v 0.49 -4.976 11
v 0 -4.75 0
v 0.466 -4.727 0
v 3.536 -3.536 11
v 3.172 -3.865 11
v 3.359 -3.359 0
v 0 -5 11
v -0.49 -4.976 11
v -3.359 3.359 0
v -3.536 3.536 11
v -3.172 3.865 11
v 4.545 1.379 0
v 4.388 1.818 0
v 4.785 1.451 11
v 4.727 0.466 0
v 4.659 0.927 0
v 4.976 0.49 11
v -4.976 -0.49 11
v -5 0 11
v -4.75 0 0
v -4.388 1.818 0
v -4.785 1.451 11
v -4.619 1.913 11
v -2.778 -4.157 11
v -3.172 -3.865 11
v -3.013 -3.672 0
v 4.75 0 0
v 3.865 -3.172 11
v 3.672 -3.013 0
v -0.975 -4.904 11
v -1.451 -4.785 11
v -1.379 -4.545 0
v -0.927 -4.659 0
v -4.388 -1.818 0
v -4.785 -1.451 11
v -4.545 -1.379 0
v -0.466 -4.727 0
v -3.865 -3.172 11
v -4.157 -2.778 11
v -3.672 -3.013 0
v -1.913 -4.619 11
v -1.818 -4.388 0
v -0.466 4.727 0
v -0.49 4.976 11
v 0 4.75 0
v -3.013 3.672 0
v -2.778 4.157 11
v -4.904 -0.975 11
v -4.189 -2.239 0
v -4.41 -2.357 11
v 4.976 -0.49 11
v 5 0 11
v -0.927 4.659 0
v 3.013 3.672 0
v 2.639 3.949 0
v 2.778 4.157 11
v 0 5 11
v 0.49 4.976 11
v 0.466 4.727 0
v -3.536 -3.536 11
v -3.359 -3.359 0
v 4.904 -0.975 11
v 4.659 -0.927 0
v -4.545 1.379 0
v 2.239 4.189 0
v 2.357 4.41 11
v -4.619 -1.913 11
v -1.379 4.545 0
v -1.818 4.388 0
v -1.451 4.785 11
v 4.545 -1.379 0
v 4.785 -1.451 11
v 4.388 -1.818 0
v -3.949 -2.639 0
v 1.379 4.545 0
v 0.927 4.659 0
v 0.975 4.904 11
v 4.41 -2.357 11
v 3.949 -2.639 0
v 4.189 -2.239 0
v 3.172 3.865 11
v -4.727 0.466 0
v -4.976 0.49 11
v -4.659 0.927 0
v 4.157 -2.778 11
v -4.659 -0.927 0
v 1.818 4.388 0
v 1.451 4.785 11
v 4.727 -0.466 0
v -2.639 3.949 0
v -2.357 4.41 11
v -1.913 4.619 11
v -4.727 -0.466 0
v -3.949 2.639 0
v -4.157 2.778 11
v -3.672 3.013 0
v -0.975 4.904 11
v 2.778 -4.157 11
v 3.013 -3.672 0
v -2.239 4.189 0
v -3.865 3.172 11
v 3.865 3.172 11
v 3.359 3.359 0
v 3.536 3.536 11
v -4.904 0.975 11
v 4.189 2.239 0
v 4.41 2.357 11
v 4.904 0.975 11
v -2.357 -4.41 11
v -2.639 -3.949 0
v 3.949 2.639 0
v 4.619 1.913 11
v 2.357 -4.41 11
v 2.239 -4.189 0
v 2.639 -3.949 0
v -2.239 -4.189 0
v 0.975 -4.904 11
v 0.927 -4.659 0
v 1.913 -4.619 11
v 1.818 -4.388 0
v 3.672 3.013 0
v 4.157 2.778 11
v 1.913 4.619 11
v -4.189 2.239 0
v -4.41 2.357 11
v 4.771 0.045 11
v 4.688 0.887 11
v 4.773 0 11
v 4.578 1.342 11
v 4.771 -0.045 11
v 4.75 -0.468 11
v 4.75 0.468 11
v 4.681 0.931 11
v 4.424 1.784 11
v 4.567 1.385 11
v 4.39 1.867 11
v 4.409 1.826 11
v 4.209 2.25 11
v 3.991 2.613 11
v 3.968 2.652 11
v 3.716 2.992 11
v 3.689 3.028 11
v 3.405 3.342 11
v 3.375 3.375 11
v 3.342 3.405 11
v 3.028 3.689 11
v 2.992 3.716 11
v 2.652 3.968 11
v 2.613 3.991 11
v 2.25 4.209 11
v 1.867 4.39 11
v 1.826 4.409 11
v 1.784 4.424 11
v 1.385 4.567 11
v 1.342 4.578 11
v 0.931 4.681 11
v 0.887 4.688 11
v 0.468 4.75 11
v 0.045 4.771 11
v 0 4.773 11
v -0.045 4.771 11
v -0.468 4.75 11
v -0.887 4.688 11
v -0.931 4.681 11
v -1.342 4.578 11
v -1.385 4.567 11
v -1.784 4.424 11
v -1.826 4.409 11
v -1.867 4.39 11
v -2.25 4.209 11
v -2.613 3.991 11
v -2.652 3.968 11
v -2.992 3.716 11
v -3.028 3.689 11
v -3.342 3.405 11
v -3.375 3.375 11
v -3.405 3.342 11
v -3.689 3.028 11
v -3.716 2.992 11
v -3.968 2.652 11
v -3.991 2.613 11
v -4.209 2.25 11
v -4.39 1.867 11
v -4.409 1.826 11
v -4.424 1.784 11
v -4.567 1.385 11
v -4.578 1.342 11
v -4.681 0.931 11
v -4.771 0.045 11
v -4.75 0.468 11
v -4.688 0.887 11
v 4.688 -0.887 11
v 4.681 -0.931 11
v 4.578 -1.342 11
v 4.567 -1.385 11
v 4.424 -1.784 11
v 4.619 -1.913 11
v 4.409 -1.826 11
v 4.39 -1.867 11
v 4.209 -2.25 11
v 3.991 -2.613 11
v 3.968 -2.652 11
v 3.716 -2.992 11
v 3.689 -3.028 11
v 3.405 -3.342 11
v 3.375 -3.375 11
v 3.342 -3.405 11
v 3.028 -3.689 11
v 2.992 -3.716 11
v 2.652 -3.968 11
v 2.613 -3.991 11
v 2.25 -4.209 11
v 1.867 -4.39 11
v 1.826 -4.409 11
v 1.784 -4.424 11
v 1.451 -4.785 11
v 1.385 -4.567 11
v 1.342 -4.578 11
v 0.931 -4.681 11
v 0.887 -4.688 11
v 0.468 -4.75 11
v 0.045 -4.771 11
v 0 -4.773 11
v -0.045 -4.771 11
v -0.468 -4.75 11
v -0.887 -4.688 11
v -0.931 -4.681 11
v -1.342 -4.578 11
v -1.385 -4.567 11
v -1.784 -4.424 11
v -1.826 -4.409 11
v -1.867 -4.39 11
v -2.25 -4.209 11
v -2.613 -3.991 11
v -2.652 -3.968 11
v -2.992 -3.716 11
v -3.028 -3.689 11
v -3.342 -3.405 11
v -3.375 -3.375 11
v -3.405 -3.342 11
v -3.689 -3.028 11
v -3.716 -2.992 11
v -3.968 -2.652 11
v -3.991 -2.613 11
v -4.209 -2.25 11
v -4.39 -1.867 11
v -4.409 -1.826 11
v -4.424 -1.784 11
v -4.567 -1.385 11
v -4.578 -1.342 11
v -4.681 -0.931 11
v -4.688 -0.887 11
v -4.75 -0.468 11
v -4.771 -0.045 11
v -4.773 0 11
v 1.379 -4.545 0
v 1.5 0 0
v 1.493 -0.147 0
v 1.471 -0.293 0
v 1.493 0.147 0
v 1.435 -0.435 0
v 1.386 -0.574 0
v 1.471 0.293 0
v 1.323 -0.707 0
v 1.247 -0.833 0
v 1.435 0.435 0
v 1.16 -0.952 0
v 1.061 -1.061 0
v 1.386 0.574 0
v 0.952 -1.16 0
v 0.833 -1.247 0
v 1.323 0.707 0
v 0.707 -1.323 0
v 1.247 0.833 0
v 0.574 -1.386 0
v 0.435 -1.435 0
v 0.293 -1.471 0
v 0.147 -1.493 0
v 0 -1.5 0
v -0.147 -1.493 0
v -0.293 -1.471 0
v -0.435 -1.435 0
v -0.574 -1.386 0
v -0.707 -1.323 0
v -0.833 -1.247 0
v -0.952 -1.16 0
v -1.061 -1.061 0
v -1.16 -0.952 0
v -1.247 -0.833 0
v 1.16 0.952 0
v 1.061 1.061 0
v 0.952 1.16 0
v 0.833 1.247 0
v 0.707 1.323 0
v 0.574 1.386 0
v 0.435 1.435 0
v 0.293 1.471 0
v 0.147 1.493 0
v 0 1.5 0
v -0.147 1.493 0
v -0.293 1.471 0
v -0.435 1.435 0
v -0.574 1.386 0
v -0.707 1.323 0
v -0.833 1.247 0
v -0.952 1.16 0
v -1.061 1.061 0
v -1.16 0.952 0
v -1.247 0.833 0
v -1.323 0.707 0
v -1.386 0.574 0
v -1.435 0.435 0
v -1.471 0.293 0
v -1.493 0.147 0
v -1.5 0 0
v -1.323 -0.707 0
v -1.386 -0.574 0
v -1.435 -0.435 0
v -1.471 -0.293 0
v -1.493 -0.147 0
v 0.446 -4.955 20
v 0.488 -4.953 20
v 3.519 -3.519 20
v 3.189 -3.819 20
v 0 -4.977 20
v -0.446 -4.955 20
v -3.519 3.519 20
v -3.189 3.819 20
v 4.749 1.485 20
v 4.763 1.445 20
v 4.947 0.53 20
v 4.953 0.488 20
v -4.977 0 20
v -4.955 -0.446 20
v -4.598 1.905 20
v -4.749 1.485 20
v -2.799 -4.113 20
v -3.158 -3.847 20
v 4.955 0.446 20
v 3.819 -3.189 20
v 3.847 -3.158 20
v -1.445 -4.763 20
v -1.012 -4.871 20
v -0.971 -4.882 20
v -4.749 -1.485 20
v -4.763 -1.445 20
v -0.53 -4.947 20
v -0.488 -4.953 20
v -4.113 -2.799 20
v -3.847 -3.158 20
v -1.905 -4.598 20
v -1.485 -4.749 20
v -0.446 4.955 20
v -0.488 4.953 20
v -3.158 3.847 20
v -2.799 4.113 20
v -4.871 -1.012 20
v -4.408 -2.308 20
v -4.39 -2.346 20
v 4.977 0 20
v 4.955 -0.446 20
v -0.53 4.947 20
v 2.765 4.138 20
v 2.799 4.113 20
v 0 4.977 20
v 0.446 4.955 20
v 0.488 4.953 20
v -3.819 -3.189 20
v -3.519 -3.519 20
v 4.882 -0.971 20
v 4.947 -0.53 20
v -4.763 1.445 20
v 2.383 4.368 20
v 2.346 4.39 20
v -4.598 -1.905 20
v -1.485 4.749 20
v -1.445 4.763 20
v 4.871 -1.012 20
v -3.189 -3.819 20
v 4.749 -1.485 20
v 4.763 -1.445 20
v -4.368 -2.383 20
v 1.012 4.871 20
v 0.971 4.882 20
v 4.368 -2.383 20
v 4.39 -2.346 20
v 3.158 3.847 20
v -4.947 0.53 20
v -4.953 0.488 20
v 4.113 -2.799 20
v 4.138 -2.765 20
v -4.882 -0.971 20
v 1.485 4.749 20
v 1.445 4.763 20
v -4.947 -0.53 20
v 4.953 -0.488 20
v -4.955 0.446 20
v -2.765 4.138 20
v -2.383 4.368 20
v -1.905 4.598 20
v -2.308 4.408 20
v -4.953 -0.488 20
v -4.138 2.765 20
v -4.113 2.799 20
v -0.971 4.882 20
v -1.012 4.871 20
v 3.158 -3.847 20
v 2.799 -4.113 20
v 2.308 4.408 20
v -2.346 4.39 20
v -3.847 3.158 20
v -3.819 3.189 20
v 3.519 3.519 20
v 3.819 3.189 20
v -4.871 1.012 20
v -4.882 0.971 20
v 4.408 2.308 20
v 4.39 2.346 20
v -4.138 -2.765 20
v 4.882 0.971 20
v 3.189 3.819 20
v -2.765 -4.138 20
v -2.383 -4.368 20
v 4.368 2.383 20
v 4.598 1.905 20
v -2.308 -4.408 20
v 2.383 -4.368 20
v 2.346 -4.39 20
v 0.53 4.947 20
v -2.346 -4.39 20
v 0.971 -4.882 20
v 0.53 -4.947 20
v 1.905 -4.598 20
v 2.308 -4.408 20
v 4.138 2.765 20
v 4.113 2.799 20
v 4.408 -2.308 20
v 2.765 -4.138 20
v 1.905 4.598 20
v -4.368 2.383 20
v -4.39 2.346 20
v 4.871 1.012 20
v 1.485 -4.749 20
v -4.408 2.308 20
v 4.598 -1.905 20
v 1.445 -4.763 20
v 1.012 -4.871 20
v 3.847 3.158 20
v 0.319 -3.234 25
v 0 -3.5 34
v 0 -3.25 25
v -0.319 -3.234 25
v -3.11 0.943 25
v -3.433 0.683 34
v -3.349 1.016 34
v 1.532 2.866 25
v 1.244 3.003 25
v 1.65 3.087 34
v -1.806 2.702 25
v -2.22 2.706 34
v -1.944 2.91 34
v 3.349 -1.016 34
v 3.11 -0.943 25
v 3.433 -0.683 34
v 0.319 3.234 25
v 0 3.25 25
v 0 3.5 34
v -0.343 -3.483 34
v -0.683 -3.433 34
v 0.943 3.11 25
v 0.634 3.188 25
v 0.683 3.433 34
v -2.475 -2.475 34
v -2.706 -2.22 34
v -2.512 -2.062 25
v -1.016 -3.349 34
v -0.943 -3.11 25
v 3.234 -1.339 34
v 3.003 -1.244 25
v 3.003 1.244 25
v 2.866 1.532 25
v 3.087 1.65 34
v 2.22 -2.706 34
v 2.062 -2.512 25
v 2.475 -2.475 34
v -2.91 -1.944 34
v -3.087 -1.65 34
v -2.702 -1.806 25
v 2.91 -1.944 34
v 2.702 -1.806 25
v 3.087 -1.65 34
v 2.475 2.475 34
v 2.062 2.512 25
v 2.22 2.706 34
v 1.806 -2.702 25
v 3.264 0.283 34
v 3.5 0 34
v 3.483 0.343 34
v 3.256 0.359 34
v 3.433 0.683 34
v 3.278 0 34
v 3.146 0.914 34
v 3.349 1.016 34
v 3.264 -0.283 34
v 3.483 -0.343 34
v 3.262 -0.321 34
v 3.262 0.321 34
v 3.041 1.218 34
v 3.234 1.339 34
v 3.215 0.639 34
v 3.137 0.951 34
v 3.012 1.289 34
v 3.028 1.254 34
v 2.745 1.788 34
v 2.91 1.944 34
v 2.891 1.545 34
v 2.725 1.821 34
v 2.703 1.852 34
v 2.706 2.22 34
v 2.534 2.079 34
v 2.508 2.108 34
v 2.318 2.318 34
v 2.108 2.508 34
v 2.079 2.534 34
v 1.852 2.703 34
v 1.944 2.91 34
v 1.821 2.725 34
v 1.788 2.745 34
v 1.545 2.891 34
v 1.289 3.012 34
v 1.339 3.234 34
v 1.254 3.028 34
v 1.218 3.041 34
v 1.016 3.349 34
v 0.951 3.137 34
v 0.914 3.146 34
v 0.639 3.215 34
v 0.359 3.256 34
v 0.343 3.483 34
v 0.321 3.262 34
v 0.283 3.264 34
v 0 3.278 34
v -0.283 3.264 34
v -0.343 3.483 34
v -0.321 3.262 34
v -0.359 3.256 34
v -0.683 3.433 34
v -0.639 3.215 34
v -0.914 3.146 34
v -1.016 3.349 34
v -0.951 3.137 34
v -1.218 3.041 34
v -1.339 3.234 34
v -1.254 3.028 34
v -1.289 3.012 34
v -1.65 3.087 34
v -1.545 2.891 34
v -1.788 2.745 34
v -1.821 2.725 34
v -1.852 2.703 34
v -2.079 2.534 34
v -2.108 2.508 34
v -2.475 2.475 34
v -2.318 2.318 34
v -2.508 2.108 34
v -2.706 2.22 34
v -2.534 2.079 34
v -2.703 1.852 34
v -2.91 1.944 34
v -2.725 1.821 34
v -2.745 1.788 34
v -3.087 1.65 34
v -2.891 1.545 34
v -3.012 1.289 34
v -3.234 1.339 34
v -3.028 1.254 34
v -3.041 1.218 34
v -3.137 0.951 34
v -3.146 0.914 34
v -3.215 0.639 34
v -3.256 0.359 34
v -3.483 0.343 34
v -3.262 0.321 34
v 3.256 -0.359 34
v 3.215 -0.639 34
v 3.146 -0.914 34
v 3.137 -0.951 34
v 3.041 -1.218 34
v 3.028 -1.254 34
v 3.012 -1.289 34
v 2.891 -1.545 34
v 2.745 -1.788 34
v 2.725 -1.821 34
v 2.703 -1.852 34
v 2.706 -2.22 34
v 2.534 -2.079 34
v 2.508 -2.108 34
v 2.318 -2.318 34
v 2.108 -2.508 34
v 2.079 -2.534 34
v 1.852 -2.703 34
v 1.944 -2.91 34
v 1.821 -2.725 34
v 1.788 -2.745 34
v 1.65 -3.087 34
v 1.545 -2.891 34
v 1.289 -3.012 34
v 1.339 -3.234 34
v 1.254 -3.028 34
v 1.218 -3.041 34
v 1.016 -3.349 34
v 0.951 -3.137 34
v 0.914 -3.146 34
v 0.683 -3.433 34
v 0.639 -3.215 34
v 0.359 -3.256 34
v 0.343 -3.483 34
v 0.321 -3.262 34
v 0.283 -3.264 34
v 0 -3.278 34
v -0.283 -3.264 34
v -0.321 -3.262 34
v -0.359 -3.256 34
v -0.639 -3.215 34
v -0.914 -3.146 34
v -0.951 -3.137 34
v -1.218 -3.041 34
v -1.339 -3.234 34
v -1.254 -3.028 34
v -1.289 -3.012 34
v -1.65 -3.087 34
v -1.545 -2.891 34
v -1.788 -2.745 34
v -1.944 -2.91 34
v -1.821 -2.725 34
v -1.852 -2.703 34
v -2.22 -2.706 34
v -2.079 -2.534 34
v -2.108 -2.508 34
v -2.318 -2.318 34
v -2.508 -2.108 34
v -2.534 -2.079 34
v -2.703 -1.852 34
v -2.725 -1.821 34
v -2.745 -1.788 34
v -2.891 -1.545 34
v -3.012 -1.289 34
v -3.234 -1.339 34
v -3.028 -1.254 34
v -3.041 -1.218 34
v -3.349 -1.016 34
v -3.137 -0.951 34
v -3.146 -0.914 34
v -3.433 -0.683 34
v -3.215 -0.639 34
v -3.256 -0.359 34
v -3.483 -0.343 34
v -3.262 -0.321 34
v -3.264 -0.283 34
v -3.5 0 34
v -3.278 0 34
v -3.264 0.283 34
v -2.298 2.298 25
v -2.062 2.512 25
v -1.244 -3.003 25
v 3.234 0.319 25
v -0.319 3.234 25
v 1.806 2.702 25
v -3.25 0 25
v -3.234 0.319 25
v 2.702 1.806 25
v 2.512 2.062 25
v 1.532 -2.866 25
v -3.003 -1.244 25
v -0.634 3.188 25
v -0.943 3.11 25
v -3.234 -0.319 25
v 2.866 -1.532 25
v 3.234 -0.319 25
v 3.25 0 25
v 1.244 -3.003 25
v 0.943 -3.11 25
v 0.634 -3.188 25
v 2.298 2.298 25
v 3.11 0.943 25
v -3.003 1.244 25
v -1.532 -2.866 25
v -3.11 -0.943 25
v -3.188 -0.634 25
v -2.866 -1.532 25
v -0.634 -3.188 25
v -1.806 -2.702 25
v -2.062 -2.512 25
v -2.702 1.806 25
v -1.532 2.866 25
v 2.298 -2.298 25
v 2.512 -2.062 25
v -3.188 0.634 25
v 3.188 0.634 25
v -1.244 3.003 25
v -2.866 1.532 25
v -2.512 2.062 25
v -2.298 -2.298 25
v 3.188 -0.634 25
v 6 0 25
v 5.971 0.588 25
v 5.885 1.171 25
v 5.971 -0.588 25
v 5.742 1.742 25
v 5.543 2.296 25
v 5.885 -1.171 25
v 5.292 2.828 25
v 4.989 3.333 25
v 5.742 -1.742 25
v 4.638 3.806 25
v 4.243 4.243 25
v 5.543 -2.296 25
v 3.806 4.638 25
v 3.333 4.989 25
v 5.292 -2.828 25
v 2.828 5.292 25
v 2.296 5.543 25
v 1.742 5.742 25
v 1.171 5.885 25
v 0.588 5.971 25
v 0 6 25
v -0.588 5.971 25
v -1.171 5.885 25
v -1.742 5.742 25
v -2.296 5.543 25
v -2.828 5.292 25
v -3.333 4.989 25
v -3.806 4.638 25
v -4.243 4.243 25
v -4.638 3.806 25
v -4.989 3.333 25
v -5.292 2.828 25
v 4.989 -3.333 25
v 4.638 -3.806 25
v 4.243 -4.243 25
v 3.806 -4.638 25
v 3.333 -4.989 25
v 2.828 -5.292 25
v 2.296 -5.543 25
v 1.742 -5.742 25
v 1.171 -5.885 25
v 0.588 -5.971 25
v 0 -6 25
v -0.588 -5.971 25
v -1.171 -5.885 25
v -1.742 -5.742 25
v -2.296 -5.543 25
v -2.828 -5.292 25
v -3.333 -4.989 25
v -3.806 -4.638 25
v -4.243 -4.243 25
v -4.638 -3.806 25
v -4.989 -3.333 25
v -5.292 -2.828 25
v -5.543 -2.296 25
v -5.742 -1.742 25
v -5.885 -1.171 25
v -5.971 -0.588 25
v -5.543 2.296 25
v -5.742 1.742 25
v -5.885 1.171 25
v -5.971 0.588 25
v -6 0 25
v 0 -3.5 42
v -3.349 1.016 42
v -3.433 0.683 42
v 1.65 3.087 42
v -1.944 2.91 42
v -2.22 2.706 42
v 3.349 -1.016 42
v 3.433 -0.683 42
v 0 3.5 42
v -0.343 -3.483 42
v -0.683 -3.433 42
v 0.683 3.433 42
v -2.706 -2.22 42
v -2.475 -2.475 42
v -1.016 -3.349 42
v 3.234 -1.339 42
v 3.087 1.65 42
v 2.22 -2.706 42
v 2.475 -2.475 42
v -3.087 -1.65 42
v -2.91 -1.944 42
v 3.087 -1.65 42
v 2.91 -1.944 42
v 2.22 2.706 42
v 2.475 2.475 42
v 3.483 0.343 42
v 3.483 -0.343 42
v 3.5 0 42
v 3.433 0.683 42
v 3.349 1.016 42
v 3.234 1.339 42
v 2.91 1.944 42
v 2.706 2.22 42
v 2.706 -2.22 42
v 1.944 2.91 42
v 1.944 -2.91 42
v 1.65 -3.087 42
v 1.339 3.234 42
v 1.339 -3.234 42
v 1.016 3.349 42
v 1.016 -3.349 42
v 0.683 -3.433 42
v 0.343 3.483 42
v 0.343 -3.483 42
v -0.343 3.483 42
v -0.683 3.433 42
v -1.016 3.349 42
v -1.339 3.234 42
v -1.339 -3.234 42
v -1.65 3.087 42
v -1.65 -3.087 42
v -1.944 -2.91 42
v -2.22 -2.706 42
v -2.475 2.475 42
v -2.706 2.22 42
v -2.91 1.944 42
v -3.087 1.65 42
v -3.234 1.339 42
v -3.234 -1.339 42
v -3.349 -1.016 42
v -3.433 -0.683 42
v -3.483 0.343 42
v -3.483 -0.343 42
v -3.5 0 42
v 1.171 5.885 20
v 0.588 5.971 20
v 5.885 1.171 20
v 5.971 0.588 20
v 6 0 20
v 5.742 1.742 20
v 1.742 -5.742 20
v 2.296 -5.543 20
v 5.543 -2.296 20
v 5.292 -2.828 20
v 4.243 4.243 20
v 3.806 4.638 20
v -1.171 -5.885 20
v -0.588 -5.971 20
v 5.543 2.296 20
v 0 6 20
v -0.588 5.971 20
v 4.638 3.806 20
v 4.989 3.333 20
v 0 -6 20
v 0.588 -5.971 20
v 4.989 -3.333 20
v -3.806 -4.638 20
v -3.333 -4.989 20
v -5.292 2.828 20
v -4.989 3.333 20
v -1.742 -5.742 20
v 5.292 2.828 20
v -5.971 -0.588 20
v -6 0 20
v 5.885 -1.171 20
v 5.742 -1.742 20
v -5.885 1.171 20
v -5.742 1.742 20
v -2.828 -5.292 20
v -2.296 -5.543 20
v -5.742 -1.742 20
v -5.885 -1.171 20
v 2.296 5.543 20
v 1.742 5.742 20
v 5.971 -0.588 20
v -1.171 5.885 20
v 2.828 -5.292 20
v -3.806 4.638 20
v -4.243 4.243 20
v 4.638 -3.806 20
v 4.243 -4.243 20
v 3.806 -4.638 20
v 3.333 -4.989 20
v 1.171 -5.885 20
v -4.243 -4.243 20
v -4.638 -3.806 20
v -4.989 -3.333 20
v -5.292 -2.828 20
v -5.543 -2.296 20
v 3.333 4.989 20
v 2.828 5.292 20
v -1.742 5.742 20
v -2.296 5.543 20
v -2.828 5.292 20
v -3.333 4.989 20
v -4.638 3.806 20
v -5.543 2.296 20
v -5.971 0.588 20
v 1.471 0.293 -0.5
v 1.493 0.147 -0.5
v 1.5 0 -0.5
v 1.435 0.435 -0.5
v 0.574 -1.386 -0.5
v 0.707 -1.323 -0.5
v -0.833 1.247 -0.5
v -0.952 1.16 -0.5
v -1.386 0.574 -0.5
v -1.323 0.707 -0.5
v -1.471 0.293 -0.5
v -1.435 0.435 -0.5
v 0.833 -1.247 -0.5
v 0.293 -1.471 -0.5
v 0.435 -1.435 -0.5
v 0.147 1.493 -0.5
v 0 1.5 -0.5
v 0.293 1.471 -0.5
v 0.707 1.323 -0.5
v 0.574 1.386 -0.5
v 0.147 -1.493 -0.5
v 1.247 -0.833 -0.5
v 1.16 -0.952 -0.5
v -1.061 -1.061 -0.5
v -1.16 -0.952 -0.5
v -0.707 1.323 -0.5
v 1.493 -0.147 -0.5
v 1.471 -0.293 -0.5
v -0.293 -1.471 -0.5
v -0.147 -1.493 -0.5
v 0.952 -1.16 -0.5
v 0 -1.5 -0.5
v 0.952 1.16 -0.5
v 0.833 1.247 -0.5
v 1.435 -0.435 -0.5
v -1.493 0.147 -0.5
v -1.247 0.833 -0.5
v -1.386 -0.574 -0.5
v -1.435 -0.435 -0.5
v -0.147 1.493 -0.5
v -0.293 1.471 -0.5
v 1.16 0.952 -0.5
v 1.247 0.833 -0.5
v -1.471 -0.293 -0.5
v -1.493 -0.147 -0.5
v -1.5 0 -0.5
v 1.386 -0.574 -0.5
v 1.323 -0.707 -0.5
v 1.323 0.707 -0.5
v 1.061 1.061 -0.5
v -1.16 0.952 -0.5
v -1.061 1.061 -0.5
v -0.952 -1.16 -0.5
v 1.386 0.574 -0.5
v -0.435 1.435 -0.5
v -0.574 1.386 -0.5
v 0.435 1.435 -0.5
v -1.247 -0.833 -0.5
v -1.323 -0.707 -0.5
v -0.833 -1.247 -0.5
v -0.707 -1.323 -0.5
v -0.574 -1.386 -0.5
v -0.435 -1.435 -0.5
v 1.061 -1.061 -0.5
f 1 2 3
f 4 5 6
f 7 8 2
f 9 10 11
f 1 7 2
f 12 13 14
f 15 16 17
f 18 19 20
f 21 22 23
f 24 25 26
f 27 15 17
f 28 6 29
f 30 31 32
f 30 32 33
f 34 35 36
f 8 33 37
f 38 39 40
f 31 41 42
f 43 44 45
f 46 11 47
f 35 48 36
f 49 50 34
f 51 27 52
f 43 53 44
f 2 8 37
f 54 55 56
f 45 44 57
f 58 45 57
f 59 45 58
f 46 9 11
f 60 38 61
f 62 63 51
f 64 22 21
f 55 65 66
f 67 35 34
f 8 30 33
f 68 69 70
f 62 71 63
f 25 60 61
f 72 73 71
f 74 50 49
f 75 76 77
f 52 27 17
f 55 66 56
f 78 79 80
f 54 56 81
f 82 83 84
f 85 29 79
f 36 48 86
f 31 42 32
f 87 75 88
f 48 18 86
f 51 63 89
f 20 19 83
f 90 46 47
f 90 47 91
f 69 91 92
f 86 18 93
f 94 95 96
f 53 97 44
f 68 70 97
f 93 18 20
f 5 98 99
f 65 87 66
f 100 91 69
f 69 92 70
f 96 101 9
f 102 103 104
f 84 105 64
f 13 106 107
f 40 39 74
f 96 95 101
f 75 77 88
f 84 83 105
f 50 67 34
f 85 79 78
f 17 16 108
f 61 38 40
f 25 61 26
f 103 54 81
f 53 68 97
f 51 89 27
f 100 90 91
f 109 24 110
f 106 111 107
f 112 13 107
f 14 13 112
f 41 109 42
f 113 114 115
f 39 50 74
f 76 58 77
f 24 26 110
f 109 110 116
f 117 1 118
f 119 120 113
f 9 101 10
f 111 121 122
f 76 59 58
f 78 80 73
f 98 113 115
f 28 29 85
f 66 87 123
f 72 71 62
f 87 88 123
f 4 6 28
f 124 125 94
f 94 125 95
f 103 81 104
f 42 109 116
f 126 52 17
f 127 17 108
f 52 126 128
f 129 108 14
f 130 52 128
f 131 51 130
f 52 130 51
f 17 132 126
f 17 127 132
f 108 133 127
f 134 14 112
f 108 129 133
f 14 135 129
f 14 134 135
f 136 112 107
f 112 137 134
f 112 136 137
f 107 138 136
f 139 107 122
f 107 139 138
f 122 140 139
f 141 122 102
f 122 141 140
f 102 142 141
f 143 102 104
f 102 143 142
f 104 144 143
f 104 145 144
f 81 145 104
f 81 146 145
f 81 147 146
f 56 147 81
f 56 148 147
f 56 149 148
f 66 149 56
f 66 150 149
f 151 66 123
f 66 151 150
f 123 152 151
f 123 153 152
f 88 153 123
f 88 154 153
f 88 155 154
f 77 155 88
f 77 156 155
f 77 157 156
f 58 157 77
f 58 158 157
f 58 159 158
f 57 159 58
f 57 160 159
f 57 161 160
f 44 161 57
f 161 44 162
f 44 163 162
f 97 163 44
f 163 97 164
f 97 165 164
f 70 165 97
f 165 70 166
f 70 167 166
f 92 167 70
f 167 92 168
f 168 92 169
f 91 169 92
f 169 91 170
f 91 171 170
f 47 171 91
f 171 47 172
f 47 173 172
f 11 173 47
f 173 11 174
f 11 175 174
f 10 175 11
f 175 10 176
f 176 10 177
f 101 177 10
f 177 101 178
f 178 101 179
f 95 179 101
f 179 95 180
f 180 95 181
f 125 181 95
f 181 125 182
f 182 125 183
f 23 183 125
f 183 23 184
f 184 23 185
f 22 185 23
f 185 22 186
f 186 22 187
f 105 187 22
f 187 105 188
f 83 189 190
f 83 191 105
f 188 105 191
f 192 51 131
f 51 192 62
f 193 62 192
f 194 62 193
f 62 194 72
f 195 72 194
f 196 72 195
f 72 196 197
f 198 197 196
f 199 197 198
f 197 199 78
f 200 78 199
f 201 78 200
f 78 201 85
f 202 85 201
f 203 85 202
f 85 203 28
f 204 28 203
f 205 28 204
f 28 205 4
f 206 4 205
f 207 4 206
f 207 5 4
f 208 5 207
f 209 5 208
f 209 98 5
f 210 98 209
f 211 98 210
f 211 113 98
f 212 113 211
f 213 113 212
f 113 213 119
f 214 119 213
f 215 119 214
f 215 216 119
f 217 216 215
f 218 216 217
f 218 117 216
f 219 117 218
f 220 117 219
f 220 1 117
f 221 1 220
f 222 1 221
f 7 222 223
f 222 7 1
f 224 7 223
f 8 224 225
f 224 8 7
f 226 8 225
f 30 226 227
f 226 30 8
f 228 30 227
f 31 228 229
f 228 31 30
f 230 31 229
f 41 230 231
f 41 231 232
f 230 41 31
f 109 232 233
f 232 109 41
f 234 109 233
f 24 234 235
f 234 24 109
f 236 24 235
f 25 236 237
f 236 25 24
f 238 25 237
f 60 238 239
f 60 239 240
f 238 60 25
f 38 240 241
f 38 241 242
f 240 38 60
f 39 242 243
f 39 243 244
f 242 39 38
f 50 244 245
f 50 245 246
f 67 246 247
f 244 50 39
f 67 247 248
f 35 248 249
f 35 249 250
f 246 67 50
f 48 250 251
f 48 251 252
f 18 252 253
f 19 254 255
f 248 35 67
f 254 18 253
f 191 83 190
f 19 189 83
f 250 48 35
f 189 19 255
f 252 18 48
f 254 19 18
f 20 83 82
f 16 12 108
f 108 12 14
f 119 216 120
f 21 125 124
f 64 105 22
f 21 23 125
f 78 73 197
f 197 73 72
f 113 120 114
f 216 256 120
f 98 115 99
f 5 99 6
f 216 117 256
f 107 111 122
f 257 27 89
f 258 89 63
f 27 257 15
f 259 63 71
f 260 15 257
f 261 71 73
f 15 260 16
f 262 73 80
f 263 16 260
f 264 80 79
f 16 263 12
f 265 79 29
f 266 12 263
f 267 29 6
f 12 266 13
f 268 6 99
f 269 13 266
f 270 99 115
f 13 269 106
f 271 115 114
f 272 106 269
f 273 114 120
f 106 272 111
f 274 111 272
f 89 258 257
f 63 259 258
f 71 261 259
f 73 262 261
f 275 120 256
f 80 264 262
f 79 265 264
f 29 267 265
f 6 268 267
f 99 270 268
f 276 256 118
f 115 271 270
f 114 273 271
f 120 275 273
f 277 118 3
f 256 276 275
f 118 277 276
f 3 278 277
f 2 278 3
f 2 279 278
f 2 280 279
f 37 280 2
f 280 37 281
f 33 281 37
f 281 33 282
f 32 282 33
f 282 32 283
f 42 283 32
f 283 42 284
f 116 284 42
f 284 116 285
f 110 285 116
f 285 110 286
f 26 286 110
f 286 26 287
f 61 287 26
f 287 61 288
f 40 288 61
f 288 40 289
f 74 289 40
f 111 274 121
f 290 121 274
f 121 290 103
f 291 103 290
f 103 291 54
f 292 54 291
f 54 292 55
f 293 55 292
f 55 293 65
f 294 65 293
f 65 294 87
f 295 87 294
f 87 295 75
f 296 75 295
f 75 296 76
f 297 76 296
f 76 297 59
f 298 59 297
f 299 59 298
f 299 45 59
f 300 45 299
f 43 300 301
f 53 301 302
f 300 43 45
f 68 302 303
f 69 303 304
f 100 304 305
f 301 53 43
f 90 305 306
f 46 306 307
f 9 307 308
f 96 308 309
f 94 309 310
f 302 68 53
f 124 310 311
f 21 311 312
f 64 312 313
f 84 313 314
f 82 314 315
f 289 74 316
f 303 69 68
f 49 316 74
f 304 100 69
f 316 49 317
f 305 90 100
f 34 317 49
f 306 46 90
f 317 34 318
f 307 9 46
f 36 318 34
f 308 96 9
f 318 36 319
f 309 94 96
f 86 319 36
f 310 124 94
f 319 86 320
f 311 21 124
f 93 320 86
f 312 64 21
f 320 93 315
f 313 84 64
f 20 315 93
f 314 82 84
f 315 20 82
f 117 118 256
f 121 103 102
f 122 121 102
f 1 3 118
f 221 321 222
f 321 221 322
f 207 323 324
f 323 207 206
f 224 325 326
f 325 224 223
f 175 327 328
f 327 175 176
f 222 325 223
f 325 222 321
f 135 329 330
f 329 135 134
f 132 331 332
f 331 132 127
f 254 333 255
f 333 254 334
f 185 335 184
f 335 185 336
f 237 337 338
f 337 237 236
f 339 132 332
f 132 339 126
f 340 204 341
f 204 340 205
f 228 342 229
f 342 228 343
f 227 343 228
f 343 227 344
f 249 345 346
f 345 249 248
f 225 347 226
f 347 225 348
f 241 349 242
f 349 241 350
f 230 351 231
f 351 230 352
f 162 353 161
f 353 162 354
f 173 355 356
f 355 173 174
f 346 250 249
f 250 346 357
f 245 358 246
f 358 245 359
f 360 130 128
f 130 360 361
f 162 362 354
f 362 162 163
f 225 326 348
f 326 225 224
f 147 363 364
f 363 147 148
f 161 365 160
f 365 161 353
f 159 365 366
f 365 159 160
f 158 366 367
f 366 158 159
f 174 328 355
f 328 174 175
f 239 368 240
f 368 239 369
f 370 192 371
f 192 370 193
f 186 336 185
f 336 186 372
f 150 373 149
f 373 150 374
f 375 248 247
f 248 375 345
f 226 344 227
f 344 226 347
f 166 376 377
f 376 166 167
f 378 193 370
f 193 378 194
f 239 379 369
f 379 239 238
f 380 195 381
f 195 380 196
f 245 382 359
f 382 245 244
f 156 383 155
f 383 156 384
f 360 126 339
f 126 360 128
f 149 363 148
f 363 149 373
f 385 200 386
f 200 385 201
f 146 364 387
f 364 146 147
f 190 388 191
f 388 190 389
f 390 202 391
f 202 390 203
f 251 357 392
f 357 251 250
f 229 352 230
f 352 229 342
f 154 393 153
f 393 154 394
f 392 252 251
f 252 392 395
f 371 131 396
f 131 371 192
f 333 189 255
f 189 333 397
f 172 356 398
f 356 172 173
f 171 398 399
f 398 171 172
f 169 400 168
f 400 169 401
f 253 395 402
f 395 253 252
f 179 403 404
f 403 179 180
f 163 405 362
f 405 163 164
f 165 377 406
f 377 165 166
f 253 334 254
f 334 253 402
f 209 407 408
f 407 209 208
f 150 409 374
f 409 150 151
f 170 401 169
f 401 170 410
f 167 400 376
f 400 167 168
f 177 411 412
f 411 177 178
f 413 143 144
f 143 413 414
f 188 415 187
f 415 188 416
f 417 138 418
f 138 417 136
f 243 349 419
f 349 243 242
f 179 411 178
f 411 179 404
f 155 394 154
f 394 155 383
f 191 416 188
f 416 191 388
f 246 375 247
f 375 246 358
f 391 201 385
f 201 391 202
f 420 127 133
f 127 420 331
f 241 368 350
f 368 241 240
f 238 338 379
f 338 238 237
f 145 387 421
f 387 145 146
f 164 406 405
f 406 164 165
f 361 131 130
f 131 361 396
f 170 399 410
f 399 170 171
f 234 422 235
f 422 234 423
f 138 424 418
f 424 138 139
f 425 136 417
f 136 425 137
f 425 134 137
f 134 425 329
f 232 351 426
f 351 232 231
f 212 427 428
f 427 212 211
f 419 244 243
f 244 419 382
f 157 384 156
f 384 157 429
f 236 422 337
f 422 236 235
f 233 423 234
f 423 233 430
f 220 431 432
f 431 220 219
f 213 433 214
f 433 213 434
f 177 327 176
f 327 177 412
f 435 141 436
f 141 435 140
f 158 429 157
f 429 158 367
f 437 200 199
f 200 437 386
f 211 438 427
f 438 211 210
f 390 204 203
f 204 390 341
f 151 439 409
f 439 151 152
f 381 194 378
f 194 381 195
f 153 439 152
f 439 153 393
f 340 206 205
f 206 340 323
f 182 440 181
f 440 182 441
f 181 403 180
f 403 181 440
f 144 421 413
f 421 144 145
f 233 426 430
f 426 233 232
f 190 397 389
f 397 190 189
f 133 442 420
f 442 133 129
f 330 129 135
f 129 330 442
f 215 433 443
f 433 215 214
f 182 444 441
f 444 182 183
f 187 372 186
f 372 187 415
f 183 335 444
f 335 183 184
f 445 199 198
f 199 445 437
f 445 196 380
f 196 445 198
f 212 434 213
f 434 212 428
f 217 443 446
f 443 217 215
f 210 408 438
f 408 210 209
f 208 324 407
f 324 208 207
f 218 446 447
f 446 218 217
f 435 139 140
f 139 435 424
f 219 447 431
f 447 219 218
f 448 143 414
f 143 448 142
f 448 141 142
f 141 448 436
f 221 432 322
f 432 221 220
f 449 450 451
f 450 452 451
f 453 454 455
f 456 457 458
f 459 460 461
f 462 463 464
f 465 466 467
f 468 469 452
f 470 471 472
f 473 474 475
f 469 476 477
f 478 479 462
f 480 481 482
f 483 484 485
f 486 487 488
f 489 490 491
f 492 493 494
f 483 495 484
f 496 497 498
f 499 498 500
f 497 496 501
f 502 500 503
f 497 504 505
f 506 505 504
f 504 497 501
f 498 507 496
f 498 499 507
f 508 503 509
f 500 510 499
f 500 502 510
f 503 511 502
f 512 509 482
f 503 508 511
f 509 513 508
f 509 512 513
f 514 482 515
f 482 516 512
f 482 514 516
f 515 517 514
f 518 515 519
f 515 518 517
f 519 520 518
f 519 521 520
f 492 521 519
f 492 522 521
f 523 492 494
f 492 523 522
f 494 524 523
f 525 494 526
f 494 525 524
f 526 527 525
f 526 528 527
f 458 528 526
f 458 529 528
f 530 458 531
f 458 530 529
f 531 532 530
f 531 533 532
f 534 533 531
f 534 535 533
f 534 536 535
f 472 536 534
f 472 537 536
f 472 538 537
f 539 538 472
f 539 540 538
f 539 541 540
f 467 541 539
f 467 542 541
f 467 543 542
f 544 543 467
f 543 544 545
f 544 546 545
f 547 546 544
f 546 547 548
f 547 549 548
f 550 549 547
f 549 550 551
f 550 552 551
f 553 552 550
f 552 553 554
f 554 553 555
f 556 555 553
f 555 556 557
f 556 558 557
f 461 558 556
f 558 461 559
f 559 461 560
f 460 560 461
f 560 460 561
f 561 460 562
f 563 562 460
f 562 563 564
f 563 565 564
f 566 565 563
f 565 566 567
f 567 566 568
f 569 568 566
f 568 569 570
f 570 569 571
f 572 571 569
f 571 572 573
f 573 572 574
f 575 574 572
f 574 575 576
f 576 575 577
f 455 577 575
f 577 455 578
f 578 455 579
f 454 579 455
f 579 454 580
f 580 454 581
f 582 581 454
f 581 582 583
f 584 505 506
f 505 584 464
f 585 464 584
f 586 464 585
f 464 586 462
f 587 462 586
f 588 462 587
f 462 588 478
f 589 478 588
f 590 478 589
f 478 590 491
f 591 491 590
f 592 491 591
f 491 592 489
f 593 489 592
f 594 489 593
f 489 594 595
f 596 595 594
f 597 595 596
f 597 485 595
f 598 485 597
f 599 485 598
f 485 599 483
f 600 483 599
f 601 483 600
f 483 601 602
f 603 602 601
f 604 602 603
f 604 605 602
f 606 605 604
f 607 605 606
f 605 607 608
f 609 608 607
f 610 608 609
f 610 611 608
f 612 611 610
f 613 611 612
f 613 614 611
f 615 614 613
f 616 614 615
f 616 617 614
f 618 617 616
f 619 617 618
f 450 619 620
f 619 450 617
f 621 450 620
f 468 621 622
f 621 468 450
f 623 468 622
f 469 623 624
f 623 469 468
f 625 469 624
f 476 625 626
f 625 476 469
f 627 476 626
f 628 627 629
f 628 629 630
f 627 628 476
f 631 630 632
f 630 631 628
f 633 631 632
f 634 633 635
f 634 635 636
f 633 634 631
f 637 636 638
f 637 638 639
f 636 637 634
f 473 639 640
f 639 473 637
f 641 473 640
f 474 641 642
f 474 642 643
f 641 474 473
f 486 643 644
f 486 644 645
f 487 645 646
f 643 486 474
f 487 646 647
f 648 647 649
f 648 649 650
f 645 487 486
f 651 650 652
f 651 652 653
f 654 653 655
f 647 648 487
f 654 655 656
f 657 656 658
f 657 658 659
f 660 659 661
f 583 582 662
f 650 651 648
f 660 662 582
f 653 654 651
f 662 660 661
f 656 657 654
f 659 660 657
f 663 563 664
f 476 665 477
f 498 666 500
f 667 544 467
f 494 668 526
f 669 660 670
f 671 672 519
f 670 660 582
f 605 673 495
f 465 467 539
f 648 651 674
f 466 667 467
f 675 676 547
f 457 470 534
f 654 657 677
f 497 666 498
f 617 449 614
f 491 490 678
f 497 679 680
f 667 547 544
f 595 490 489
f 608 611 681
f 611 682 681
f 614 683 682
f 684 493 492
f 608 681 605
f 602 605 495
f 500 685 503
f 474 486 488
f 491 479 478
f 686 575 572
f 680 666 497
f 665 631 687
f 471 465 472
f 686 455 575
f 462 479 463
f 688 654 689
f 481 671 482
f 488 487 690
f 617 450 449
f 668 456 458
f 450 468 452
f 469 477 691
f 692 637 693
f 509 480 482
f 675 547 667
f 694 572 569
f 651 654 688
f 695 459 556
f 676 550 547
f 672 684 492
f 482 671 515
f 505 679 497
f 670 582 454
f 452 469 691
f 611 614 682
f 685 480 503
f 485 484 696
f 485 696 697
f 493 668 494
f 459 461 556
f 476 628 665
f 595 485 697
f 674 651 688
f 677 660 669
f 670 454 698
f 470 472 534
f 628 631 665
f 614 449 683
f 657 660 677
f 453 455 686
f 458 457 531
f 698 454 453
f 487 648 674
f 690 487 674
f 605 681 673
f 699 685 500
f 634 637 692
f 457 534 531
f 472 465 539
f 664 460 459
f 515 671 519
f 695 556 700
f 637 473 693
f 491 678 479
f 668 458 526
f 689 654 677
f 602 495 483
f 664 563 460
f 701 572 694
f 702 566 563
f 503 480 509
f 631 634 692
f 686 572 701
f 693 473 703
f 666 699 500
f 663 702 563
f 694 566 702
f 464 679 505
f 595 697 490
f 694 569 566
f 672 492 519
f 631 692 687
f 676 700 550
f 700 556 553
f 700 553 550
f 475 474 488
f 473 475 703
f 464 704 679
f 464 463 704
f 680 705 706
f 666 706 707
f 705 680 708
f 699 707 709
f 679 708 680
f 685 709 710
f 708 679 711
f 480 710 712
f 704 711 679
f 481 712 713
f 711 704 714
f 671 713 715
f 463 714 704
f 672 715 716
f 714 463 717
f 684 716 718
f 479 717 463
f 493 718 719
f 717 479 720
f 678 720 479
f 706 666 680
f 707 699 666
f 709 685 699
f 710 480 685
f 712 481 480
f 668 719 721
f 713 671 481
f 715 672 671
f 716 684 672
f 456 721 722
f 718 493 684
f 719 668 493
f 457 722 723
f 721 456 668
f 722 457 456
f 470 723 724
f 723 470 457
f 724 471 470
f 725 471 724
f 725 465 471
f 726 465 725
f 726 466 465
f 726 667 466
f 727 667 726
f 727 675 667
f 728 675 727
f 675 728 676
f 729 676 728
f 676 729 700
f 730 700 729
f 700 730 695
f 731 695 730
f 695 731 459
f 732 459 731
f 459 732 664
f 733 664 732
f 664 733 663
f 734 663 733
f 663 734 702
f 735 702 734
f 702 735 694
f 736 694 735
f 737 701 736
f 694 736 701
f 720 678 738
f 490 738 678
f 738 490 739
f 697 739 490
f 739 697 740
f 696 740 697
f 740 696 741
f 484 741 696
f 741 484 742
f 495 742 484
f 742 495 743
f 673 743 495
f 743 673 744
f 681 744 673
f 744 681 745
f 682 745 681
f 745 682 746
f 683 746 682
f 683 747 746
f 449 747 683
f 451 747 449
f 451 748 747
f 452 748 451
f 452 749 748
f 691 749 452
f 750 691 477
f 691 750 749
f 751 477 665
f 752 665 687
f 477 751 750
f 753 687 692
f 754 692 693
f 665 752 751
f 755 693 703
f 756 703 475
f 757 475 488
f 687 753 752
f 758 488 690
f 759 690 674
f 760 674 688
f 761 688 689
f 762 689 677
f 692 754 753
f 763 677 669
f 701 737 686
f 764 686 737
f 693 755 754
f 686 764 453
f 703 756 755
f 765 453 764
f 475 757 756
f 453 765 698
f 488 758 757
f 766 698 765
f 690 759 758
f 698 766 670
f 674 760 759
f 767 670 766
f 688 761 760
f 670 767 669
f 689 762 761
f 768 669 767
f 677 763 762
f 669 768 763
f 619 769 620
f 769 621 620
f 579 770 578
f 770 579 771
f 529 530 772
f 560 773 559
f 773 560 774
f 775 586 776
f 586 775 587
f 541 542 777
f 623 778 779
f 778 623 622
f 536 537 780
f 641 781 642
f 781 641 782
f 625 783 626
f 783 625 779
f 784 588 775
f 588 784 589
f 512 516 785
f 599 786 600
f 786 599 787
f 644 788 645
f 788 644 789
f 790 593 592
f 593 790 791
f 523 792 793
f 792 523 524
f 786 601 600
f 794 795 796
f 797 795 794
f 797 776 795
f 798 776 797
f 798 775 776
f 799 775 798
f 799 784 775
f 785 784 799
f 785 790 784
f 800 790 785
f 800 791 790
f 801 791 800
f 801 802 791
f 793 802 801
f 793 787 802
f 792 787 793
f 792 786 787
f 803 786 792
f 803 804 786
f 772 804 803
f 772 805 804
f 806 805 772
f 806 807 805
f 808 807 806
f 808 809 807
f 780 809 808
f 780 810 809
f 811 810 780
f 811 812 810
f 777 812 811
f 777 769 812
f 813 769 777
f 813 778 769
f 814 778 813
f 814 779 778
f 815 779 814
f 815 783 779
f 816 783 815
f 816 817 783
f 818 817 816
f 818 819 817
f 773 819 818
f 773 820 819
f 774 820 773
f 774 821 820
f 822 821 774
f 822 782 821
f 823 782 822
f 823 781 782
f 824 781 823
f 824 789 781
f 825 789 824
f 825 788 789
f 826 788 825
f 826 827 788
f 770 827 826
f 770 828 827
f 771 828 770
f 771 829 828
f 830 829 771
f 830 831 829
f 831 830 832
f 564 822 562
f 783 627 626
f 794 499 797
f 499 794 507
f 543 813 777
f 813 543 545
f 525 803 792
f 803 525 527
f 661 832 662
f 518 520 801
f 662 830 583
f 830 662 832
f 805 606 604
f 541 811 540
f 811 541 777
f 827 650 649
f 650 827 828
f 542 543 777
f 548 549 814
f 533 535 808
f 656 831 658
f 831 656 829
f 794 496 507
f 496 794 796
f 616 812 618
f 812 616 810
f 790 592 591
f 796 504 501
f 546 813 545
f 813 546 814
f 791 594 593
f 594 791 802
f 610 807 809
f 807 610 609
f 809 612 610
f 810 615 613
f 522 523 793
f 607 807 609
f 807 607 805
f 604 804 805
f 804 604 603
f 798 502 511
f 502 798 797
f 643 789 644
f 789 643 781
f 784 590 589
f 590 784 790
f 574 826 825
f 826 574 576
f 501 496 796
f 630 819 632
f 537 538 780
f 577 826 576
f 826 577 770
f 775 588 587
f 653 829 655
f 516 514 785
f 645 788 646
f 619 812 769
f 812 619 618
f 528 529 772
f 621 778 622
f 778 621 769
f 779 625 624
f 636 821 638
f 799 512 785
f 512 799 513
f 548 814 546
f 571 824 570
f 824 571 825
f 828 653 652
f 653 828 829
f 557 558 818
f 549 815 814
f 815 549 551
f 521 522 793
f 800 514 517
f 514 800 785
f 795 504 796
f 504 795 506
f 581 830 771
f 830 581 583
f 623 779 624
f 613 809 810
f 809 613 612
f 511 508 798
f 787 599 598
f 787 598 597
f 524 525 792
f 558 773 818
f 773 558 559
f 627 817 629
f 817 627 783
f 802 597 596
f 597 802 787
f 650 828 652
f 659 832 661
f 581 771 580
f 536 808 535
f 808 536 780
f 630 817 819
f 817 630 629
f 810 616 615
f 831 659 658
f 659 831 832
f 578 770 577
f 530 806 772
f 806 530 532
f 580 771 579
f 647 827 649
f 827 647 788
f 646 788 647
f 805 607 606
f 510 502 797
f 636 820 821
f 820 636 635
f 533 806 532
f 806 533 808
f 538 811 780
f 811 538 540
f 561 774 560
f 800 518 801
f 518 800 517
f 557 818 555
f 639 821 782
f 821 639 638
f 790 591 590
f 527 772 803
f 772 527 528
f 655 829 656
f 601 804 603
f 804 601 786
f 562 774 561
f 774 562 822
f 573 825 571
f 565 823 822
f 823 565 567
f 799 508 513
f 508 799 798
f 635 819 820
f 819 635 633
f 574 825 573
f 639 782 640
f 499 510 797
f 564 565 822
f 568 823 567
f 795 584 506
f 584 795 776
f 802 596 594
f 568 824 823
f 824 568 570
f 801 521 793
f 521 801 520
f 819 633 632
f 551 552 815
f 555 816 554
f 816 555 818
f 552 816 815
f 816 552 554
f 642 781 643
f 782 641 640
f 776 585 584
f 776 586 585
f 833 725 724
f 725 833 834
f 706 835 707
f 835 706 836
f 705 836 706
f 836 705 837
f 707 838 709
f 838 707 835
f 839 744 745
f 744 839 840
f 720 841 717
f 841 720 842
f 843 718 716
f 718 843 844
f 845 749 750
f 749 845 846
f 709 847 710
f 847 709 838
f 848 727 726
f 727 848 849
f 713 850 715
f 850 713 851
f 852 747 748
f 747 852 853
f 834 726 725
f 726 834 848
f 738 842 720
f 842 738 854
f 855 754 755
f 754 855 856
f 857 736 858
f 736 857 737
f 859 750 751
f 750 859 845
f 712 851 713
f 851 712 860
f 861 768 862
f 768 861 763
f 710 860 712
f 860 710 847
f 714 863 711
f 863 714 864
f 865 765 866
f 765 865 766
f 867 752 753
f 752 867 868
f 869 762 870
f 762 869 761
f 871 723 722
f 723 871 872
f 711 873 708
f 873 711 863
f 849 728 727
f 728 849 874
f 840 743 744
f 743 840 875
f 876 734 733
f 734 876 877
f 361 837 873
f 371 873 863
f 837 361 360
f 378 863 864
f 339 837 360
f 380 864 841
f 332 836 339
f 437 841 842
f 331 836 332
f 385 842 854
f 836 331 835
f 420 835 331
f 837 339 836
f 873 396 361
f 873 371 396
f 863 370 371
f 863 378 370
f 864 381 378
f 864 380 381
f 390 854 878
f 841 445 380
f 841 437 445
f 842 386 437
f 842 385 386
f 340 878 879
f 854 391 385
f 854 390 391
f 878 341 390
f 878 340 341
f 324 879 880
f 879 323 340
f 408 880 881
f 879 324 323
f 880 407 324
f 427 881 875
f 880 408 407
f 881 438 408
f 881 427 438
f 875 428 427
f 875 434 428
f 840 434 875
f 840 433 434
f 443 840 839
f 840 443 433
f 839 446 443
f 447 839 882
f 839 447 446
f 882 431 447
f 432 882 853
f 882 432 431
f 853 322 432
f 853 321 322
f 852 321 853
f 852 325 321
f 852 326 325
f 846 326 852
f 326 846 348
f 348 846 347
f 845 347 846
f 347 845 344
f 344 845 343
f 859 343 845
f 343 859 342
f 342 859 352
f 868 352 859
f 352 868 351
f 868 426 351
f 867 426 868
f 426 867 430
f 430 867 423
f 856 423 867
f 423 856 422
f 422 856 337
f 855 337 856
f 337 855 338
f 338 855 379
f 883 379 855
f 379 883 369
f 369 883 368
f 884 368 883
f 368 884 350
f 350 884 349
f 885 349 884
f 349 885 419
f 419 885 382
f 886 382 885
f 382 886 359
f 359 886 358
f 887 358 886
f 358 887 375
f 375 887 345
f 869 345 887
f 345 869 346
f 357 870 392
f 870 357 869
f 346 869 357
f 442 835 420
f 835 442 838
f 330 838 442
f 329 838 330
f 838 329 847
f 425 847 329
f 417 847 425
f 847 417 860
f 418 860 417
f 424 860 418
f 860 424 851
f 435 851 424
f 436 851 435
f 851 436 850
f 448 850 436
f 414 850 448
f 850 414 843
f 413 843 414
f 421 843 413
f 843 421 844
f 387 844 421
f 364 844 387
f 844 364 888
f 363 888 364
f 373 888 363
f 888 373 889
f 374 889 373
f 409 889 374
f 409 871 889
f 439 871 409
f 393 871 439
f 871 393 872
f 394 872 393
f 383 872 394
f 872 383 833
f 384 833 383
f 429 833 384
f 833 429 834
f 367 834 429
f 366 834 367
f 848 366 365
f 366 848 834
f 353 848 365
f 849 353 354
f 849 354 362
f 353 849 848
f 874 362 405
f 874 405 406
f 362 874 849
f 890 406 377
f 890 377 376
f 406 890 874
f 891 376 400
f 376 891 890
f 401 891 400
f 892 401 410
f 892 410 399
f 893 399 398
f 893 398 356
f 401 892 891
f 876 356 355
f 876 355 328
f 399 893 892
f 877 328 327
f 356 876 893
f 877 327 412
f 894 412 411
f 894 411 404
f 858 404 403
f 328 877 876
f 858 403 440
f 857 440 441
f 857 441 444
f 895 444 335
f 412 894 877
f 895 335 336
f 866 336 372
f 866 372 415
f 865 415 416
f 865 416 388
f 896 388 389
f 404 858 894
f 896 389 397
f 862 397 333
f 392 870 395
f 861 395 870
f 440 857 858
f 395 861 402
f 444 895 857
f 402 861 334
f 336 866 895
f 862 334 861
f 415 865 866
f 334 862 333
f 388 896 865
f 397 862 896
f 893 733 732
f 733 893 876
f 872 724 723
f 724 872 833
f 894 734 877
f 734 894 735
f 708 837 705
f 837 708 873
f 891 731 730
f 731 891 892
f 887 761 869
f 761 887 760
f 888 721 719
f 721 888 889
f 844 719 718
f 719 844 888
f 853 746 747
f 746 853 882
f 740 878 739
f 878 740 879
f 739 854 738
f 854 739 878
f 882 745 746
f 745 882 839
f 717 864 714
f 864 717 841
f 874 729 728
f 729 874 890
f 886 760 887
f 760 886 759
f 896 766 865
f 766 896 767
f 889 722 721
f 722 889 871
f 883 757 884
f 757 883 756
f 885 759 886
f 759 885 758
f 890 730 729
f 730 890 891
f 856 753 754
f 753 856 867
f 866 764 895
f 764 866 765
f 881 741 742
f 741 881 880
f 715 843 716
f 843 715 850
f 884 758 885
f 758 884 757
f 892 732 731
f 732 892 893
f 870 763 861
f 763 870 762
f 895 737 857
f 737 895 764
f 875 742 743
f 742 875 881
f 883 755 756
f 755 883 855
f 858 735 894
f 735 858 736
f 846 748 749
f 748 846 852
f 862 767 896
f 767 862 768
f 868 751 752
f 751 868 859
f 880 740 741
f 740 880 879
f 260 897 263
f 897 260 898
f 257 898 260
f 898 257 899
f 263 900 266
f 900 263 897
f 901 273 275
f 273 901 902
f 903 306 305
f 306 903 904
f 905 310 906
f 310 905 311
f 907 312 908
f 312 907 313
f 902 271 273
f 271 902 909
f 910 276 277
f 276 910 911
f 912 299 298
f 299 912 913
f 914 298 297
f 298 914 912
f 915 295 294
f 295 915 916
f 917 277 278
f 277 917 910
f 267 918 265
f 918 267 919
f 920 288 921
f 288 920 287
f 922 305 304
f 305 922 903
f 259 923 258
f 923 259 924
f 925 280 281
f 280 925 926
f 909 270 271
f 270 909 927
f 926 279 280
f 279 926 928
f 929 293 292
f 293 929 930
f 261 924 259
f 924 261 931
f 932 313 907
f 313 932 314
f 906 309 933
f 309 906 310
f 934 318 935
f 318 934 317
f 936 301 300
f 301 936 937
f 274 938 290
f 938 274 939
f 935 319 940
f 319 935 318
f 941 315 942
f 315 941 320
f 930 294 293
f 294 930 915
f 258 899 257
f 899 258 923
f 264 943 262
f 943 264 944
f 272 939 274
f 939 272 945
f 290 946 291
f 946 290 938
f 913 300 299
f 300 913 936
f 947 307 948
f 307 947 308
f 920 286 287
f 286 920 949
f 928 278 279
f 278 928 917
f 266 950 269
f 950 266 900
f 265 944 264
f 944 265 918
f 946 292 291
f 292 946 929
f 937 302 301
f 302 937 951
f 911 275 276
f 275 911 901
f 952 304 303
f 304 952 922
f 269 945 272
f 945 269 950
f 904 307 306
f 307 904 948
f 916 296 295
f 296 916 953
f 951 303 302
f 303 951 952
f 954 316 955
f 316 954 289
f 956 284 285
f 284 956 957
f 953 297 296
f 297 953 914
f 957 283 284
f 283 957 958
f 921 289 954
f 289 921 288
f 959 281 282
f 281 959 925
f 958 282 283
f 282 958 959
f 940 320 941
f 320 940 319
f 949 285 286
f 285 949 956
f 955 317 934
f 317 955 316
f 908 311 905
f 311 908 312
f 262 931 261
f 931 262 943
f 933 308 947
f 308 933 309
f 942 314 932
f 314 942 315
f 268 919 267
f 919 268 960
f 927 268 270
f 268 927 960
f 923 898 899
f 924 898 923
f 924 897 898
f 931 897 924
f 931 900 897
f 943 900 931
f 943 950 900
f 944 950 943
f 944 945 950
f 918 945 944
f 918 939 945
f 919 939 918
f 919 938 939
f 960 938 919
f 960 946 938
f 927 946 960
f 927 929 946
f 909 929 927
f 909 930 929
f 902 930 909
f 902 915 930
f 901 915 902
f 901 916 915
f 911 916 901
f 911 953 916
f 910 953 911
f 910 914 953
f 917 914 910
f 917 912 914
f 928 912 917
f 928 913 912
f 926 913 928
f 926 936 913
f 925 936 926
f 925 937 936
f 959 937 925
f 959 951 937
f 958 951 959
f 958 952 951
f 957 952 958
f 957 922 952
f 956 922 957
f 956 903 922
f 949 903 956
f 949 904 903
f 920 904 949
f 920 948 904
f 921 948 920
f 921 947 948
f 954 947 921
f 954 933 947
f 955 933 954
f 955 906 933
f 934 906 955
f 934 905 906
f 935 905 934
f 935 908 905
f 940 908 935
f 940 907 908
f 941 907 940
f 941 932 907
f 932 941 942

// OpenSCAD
// Straight hose-barb reducer: 8 mm tubing to 5 mm tubing
// Print orientation: standing upright along +Z, centred on origin in X/Y

$fn = 64;

// ---- Dimensions (mm) ----
tube1_id     = 8;    // first tubing inner diameter
tube2_id     = 5;    // second tubing inner diameter
barb1_height = 10;   // first barb height
barb2_height = 8;    // second barb height
collar_d     = 12;   // collar outer diameter
bore         = 3;    // through-bore diameter
eps          = 0.5;  // overshoot for clean cuts

// ---- Derived ----
tube1_od = tube1_id + 1.5;   // 8 mm tubing ~ 9.5 mm outer diameter
tube2_od = tube2_id + 1.5;   // 5 mm tubing ~ 6.5 mm outer diameter
barb1_base_od = 7.5;         // first barb bottom outer diameter
barb1_top_od  = 9.5;         // first barb top outer diameter
barb2_base_od = 6.5;         // second barb bottom outer diameter
barb2_top_od  = 5.0;         // second barb top outer diameter
barb1_embed   = 0.5;         // first barb overlap into collar
barb2_embed   = 0.5;         // second barb overlap into collar

// ---- Model ----
union() {
    // First barbs (z = 0 to 20)
    for (i = [0 : 1]) {
        translate([0, 0, i * barb1_height])
            hull() {
                cylinder(h = barb1_height, d = tube1_od);
                cylinder(h = barb1_height + 2 * barb1_embed,
                         d1 = tube1_od - 0.5, d2 = tube1_od + 0.5);
            }
    }

    // Collar (z = 20 to 25)
    translate([0, 0, 20])
        cylinder(h = 5, d = collar_d);

    // Second barbs (z = 25 to 41)
    for (i = [0 : 1]) {
        translate([0, 0, 25 + i * barb2_height])
            hull() {
                cylinder(h = barb2_height, d = tube2_od);
                cylinder(h = barb2_height + 2 * barb2_embed,
                         d1 = tube2_od - 0.5, d2 = tube2_od + 0.5);
            }
    }

    // Through-bore
    translate([0, 0, -eps])
        cylinder(h = 41 + 2 * eps, d = bore);
}
